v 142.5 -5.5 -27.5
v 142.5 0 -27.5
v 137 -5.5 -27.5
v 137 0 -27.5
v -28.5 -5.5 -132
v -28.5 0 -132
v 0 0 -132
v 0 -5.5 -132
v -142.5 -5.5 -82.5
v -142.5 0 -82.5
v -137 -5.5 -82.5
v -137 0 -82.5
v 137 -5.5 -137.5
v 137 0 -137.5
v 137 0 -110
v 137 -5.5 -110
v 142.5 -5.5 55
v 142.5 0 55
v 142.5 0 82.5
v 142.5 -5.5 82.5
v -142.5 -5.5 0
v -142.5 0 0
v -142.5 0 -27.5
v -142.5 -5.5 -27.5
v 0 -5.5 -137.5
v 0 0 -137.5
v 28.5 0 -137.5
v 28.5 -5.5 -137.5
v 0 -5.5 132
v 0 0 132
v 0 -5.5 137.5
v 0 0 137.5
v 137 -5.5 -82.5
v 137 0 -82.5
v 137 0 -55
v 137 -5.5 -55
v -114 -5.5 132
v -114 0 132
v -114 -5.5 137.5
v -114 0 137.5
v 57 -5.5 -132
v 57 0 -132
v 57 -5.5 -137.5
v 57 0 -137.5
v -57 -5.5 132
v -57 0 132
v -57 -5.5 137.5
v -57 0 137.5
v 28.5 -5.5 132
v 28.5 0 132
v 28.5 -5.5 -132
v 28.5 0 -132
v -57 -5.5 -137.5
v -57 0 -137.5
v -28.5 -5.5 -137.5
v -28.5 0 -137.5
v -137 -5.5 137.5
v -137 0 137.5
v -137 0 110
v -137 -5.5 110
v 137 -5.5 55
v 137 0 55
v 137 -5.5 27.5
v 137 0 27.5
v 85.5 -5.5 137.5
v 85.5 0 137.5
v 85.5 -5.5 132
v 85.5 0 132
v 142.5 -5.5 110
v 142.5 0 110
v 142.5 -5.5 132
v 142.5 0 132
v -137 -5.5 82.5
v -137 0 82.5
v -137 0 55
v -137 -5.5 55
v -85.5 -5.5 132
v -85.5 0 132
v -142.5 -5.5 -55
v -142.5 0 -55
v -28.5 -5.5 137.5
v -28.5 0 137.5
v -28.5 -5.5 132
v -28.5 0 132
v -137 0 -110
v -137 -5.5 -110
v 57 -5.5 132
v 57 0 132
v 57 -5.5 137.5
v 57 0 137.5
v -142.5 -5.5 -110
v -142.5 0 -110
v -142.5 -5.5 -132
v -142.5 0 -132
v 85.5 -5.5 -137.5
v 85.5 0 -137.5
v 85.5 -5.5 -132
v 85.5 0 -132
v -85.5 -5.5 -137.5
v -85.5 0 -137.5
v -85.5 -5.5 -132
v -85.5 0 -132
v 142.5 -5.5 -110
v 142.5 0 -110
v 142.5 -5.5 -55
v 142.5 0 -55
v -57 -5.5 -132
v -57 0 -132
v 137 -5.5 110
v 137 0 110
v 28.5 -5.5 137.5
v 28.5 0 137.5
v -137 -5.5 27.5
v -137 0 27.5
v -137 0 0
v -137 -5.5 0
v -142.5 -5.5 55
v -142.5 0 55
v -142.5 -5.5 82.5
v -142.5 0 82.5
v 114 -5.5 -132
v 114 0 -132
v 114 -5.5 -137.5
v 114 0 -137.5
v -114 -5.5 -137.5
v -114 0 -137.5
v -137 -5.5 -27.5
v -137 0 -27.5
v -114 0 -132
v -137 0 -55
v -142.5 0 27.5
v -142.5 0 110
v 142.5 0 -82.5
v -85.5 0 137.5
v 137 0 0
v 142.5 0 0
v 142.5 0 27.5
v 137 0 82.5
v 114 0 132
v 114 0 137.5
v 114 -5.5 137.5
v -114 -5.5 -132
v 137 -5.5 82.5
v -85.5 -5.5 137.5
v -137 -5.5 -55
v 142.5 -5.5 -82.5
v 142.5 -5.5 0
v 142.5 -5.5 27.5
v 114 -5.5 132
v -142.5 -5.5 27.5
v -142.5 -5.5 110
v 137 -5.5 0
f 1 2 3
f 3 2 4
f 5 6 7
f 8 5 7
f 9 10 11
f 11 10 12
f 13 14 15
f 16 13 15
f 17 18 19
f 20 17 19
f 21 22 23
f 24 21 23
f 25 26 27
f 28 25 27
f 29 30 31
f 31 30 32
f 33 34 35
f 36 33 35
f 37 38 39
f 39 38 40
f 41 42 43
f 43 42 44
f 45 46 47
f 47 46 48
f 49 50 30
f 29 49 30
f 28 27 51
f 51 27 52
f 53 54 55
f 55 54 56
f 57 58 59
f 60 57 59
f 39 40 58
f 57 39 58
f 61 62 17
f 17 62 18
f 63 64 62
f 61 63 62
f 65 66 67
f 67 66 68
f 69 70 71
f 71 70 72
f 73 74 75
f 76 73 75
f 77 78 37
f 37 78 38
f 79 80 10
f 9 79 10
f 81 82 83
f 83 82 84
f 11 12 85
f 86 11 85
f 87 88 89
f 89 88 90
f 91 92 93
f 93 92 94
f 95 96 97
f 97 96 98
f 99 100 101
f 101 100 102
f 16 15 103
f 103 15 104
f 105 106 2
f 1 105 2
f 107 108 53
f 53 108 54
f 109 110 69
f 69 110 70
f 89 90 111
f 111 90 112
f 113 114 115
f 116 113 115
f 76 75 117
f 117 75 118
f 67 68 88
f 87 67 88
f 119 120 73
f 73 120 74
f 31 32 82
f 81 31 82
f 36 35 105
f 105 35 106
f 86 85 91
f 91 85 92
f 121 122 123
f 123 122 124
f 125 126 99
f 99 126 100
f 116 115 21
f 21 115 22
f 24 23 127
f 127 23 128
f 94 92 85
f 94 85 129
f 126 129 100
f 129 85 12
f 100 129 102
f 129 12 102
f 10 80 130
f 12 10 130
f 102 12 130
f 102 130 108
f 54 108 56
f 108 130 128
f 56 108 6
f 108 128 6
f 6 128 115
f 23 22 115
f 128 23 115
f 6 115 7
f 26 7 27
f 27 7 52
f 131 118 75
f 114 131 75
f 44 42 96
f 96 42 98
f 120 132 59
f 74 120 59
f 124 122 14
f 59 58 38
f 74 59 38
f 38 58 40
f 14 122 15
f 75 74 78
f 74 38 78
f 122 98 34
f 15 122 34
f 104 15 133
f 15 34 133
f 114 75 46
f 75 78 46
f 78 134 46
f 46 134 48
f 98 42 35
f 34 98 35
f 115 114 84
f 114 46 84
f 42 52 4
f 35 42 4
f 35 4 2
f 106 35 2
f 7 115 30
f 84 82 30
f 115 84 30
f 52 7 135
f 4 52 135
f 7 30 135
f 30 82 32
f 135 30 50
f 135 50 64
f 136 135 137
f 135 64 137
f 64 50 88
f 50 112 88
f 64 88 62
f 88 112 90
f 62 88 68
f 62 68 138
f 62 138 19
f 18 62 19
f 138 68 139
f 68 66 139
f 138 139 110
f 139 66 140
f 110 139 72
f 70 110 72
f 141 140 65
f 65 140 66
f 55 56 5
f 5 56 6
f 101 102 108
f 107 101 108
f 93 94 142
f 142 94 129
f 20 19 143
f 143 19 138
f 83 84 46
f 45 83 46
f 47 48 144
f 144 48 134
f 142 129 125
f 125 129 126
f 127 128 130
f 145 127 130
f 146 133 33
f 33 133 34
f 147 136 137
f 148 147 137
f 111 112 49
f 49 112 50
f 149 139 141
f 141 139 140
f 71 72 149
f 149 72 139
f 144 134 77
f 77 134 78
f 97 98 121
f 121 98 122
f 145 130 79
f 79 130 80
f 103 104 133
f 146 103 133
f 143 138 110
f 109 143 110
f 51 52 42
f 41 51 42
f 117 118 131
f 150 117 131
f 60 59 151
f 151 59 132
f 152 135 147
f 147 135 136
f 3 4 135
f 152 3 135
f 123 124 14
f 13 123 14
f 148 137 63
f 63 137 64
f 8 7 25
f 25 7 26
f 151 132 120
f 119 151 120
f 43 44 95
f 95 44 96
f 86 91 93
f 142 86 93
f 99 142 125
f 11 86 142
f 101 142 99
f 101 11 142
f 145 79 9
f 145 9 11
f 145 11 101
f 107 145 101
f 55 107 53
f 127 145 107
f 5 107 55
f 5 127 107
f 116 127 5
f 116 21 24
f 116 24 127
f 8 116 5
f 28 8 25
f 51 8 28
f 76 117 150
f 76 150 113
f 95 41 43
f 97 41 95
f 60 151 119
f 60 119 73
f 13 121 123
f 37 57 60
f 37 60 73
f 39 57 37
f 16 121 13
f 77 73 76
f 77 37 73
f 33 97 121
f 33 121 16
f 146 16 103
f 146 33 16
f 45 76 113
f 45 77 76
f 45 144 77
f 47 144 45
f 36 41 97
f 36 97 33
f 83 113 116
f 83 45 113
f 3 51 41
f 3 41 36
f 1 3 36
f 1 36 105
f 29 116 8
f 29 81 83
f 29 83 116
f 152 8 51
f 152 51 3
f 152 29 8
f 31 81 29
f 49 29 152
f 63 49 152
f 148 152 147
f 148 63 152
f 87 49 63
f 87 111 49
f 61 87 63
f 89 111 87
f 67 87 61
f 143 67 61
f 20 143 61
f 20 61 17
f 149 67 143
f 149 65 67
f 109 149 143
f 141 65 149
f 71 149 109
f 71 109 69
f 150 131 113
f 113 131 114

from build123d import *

# Parameters (mm, degrees)
F1_DEPTH = 5.5


with BuildPart() as f1:
    # F0 (on Front) → F1 (new body)
    with BuildSketch(Plane.XZ):
        Polygon((-114, 137.5), (-137, 137.5), (-137, 110), (-142.5, 110), (-142.5, 82.5), (-137, 82.5), (-137, 55), (-142.5, 55), (-142.5, 27.5), (-137, 27.5), (-137, 0), (-142.5, 0), (-142.5, -27.5), (-137, -27.5), (-137, -55), (-142.5, -55), (-142.5, -82.5), (-137, -82.5), (-137, -110), (-142.5, -110), (-142.5, -132), (-114, -132), (-114, -137.5), (-85.5, -137.5), (-85.5, -132), (-57, -132), (-57, -137.5), (-28.5, -137.5), (-28.5, -132), (0, -132), (0, -137.5), (28.5, -137.5), (28.5, -132), (57, -132), (57, -137.5), (85.5, -137.5), (85.5, -132), (114, -132), (114, -137.5), (137, -137.5), (137, -110), (142.5, -110), (142.5, -82.5), (137, -82.5), (137, -55), (142.5, -55), (142.5, -27.5), (137, -27.5), (137, 0), (142.5, 0), (142.5, 27.5), (137, 27.5), (137, 55), (142.5, 55), (142.5, 82.5), (137, 82.5), (137, 110), (142.5, 110), (142.5, 132), (114, 132), (114, 137.5), (85.5, 137.5), (85.5, 132), (57, 132), (57, 137.5), (28.5, 137.5), (28.5, 132), (0, 132), (0, 137.5), (-28.5, 137.5), (-28.5, 132), (-57, 132), (-57, 137.5), (-85.5, 137.5), (-85.5, 132), (-114, 132), align=None)
    extrude(amount=F1_DEPTH)


solid = f1.part
